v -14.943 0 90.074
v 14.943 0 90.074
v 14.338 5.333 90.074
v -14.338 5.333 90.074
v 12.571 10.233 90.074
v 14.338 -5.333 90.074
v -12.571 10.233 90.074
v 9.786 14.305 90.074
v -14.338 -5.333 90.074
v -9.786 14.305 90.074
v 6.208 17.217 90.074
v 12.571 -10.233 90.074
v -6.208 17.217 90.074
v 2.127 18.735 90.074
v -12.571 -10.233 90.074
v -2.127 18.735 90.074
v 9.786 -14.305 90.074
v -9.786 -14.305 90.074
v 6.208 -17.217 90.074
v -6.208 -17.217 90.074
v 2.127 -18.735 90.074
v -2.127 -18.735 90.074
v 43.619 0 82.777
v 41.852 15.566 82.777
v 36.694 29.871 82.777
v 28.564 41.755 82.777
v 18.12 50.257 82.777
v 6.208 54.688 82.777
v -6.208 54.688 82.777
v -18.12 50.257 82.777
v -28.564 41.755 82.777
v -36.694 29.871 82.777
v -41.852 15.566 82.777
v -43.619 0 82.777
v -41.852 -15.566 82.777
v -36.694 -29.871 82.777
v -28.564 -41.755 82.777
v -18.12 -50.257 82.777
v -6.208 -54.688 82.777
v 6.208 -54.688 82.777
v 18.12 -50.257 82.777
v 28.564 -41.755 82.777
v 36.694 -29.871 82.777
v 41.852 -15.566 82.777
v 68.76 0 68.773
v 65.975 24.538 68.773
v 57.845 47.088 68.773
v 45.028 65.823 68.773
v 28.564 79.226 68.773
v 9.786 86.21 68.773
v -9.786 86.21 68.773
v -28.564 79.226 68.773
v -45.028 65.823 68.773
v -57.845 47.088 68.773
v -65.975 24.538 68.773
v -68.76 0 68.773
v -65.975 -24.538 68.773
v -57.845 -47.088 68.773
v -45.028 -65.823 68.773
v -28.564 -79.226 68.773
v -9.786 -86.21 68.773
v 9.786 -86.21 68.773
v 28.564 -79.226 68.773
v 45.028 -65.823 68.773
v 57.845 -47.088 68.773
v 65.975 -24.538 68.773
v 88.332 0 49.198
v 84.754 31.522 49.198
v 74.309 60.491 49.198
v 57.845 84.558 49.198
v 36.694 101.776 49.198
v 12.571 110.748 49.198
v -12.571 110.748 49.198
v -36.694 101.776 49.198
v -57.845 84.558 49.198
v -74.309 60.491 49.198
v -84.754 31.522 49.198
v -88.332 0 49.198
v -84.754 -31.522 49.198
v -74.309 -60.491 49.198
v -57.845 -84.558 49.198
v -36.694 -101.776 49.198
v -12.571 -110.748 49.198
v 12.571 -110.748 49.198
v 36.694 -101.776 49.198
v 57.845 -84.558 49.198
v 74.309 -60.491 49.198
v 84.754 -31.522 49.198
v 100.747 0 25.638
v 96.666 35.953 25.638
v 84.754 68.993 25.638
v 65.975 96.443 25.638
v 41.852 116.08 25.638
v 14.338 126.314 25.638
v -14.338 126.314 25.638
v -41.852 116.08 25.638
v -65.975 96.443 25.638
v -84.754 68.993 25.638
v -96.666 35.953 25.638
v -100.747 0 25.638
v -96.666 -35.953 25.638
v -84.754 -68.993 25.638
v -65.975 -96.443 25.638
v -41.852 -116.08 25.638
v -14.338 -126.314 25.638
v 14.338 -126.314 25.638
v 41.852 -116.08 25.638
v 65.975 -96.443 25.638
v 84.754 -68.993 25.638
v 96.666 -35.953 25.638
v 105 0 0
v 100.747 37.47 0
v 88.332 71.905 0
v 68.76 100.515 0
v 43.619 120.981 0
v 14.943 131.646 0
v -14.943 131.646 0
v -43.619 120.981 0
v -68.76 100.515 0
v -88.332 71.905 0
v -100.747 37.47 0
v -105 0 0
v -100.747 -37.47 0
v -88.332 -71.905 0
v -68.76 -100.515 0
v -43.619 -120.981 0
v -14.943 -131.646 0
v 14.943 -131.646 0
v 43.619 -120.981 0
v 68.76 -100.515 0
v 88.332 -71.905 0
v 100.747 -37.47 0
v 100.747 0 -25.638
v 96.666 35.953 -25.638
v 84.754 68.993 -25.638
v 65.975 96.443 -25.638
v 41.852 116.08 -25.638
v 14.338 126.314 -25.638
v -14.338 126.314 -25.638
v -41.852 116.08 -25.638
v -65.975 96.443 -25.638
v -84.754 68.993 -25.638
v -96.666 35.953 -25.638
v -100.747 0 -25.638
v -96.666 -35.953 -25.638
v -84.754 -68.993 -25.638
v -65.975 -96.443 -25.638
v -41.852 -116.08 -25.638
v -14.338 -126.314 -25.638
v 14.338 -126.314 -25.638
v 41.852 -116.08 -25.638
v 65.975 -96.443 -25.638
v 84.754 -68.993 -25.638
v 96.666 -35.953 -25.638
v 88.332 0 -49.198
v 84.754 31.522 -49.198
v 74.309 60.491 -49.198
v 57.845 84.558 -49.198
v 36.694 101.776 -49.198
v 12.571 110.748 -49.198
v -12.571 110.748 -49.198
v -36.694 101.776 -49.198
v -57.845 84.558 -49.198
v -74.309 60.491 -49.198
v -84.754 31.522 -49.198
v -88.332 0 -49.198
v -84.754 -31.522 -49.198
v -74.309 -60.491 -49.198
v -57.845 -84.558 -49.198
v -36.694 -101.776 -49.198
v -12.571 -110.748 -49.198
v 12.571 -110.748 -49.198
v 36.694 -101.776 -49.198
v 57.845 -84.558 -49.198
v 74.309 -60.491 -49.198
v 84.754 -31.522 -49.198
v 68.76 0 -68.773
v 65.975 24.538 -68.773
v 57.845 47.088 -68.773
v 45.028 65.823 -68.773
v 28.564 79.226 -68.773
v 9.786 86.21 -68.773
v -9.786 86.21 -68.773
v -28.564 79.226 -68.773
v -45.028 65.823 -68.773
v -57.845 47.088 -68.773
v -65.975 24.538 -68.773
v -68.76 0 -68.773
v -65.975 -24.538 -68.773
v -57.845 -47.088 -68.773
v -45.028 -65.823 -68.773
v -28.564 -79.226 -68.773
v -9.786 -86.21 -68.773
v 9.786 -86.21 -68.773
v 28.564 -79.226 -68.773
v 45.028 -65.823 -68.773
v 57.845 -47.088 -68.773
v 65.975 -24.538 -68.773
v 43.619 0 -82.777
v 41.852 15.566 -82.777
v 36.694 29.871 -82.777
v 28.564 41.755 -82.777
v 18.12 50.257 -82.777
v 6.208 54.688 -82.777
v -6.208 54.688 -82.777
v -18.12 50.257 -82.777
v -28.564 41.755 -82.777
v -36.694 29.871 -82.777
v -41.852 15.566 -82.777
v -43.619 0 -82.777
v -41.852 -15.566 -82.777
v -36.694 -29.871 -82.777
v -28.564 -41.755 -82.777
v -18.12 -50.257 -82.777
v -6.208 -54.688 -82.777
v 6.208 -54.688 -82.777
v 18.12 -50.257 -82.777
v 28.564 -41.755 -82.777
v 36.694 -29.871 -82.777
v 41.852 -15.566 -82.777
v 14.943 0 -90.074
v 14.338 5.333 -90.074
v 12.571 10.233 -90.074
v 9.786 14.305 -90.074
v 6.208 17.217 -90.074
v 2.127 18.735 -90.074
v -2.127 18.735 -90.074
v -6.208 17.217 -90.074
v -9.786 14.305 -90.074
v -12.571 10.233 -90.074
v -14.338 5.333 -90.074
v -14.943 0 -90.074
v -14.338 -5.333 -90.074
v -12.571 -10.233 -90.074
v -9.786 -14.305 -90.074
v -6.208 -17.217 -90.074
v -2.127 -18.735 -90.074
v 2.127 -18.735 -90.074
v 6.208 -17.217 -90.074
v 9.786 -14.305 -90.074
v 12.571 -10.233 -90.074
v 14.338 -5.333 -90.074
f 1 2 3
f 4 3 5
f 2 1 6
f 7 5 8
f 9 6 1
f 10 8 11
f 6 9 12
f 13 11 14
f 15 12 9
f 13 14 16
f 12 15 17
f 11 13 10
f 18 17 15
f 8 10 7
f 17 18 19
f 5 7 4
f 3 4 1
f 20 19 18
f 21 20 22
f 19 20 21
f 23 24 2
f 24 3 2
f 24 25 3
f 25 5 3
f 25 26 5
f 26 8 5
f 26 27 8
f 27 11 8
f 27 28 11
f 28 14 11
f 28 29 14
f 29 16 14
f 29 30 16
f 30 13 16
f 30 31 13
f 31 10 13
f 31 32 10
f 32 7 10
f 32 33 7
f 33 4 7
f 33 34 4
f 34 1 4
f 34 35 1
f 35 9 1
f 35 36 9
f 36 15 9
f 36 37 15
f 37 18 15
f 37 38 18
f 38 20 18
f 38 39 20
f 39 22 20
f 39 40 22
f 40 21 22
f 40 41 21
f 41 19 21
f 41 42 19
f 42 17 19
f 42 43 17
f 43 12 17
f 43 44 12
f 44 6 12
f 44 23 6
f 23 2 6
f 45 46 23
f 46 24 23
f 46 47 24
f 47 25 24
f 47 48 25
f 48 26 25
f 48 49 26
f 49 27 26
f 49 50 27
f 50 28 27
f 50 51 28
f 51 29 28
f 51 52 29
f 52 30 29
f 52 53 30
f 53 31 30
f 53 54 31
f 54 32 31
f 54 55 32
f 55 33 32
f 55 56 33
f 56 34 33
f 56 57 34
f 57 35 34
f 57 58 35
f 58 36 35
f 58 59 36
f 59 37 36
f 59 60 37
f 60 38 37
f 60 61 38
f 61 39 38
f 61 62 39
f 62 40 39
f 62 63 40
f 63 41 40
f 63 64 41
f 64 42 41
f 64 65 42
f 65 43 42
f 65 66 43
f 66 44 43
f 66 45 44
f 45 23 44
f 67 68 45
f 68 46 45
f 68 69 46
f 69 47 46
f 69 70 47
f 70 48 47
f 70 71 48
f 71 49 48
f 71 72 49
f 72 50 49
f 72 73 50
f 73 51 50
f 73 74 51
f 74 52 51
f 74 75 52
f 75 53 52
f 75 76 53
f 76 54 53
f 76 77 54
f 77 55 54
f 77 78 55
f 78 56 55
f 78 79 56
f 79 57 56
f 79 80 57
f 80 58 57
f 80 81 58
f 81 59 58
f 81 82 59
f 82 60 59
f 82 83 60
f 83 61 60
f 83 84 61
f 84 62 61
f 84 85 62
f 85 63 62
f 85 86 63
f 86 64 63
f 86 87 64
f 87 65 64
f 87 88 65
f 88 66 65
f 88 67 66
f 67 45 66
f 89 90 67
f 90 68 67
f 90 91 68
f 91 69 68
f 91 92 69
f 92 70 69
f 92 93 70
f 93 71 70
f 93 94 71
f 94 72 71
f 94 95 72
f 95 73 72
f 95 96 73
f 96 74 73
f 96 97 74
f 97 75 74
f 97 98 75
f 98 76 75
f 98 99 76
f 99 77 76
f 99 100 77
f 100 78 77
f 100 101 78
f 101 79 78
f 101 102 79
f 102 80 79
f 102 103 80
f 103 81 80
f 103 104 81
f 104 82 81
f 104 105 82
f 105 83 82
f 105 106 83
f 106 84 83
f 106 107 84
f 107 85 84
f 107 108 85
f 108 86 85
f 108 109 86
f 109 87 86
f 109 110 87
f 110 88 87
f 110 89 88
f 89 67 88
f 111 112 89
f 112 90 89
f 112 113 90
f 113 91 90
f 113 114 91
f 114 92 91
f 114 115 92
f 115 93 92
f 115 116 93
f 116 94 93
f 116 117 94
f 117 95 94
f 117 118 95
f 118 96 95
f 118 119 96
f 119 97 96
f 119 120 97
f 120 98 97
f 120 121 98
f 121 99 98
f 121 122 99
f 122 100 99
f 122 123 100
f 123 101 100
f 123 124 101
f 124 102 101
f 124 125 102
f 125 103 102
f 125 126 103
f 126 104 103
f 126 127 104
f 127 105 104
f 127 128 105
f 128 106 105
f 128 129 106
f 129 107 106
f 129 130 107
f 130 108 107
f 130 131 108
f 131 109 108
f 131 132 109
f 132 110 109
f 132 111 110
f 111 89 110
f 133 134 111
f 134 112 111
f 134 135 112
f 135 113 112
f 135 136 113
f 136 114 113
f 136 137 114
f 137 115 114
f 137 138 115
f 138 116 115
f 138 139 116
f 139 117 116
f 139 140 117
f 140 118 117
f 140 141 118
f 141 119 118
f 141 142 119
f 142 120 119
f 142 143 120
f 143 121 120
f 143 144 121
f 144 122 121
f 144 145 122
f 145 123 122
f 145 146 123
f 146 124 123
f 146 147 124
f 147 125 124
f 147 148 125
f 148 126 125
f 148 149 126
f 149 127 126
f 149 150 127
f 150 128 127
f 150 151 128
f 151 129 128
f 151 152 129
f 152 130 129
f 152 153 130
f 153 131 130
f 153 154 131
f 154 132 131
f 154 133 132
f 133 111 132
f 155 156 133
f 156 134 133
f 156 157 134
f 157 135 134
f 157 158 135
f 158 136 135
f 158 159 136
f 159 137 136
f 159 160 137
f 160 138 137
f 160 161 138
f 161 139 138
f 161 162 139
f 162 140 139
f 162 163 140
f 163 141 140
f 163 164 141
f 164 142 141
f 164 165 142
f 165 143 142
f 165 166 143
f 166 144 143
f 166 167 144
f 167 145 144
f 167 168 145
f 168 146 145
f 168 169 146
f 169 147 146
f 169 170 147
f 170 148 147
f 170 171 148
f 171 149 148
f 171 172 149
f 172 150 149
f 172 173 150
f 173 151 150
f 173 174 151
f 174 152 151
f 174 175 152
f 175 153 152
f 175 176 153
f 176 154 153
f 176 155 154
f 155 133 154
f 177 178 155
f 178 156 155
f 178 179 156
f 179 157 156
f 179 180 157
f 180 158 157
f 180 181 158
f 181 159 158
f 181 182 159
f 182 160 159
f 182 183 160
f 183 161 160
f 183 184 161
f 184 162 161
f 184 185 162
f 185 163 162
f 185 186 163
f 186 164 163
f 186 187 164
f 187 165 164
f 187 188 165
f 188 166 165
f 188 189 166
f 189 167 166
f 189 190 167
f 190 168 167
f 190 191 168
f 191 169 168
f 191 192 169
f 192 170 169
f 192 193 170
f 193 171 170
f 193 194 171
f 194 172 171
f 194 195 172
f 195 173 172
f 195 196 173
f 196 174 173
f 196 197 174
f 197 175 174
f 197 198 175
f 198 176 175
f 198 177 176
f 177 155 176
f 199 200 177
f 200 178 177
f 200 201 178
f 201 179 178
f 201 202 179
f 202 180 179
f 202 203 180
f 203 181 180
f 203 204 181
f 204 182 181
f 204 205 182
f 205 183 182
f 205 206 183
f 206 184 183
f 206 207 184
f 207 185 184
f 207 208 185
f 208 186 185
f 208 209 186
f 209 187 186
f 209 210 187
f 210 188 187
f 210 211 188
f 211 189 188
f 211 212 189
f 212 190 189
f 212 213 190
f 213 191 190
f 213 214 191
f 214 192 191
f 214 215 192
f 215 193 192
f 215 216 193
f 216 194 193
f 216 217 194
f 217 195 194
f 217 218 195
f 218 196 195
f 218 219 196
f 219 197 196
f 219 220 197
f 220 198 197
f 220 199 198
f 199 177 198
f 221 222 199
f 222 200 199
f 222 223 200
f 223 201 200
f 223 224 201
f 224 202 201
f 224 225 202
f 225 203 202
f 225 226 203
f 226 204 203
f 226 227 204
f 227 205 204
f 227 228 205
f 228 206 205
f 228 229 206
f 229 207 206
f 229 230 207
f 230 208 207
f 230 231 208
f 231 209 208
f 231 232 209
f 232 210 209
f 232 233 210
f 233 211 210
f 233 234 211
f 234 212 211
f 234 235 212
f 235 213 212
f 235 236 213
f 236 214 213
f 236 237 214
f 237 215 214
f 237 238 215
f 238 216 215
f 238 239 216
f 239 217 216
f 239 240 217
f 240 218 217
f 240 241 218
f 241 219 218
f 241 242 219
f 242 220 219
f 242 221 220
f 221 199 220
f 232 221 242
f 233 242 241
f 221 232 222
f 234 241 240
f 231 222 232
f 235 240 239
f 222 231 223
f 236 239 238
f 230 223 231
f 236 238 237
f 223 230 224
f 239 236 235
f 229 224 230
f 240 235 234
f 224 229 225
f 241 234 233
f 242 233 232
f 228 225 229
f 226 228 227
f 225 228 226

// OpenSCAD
// Generated by SolidPython 1.0.1 on 2020-07-29 00:46:52


scale(v = [15, 19, 13]) {
	sphere(r = 7);
}
/***********************************************
*********      SolidPython code:      **********
************************************************
 
# import packages: SolidPython
from solid import *
from solid.utils import *
from itertools import chain, combinations, permutations


class Resize:

    def __init__(self, scad_file):
        self.scad_file = scad_file
        #self.scad_file = import_scad(scad_file)
        # cone/cylinder param:
        self.r1 = 0
        self.r2 = 0
        self.h = 0
        # rectangular prism param:
        self.w = 0
        self.l = 0
        # ellipse param:
        self.r = 0

    # import OpenScad code (file name corresponds to shape)


    # classify shape + parameters
    def assign(self, param1, param2, param3):
        if self.scad_file == 'cone.scad':
            self.r1 = param1
            self.r2 = param2
            self.h = param3
        elif self.scad_file == 'cylinder.scad':
            self.r1 = param1
            self.r2 = param2
            self.h = param3
        elif self.scad_file == 'rectangularPrism.scad':
            self.h = param1
            self.l = param2
            self.w = param3
        else:
            self.r = param1
            self.h = param2

    # resize parameters
    def iterate(self):
        x = range(3, 20, 2)
        i = 1
        if self.scad_file == 'cone.scad':
            tempList = list(permutations(x, 2))
            for temp in tempList:
                param1 = temp[0]
                param2 = temp[1]
                filepath = 'produced_scad_files/' + 'cone' + str(param1) + '_' + str(param2) + '_' + '.scad'
                scad_render_to_file(cylinder(h=param1, r1=param2, r2=0), filepath)

        elif self.scad_file == 'cylinder.scad':
            tempList = list(permutations(x, 3))
            for temp in tempList:
                param1 = temp[0]
                param2 = temp[1]
                filepath = 'produced_scad_files/' + 'cylinder' + str(param1) + '_' + str(param2) + '_' + '.scad'
                scad_render_to_file(cylinder(h=param1, r1=param2, r2=param2), filepath)

        elif self.scad_file == 'rectangularPrism.scad':
            tempList = list(permutations(x, 3))
            for temp in tempList:
                param1 = temp[0]
                param2 = temp[1]
                param3 = temp[2]
                filepath = 'produced_scad_files/' + 'rectangularPrism' + str(param1) + '_' + str(param2) + '_' + str(
                    param3) + '.scad'
                scad_render_to_file(cube(size=(param1, param2, param3)), filepath)

        elif self.scad_file == 'ellipse.scad':
            tempList = list(permutations(x, 4))
            for temp in tempList:
                param1 = temp[0]
                param2 = temp[1]
                param3 = temp[2]
                param4 = temp[3]
                filepath = 'produced_scad_files/' + 'ellipse' + str(param1) + '_' + str(param2) + '_' + str(param3) + '_' + str(param4) + '.scad'
                scad_render_to_file(scale([param1, param2, param3])(sphere(r=param4)), filepath)

    def render_to_scadfile(self):
        scad_render_to_file(scad, 'example.scad') 
 
************************************************/
